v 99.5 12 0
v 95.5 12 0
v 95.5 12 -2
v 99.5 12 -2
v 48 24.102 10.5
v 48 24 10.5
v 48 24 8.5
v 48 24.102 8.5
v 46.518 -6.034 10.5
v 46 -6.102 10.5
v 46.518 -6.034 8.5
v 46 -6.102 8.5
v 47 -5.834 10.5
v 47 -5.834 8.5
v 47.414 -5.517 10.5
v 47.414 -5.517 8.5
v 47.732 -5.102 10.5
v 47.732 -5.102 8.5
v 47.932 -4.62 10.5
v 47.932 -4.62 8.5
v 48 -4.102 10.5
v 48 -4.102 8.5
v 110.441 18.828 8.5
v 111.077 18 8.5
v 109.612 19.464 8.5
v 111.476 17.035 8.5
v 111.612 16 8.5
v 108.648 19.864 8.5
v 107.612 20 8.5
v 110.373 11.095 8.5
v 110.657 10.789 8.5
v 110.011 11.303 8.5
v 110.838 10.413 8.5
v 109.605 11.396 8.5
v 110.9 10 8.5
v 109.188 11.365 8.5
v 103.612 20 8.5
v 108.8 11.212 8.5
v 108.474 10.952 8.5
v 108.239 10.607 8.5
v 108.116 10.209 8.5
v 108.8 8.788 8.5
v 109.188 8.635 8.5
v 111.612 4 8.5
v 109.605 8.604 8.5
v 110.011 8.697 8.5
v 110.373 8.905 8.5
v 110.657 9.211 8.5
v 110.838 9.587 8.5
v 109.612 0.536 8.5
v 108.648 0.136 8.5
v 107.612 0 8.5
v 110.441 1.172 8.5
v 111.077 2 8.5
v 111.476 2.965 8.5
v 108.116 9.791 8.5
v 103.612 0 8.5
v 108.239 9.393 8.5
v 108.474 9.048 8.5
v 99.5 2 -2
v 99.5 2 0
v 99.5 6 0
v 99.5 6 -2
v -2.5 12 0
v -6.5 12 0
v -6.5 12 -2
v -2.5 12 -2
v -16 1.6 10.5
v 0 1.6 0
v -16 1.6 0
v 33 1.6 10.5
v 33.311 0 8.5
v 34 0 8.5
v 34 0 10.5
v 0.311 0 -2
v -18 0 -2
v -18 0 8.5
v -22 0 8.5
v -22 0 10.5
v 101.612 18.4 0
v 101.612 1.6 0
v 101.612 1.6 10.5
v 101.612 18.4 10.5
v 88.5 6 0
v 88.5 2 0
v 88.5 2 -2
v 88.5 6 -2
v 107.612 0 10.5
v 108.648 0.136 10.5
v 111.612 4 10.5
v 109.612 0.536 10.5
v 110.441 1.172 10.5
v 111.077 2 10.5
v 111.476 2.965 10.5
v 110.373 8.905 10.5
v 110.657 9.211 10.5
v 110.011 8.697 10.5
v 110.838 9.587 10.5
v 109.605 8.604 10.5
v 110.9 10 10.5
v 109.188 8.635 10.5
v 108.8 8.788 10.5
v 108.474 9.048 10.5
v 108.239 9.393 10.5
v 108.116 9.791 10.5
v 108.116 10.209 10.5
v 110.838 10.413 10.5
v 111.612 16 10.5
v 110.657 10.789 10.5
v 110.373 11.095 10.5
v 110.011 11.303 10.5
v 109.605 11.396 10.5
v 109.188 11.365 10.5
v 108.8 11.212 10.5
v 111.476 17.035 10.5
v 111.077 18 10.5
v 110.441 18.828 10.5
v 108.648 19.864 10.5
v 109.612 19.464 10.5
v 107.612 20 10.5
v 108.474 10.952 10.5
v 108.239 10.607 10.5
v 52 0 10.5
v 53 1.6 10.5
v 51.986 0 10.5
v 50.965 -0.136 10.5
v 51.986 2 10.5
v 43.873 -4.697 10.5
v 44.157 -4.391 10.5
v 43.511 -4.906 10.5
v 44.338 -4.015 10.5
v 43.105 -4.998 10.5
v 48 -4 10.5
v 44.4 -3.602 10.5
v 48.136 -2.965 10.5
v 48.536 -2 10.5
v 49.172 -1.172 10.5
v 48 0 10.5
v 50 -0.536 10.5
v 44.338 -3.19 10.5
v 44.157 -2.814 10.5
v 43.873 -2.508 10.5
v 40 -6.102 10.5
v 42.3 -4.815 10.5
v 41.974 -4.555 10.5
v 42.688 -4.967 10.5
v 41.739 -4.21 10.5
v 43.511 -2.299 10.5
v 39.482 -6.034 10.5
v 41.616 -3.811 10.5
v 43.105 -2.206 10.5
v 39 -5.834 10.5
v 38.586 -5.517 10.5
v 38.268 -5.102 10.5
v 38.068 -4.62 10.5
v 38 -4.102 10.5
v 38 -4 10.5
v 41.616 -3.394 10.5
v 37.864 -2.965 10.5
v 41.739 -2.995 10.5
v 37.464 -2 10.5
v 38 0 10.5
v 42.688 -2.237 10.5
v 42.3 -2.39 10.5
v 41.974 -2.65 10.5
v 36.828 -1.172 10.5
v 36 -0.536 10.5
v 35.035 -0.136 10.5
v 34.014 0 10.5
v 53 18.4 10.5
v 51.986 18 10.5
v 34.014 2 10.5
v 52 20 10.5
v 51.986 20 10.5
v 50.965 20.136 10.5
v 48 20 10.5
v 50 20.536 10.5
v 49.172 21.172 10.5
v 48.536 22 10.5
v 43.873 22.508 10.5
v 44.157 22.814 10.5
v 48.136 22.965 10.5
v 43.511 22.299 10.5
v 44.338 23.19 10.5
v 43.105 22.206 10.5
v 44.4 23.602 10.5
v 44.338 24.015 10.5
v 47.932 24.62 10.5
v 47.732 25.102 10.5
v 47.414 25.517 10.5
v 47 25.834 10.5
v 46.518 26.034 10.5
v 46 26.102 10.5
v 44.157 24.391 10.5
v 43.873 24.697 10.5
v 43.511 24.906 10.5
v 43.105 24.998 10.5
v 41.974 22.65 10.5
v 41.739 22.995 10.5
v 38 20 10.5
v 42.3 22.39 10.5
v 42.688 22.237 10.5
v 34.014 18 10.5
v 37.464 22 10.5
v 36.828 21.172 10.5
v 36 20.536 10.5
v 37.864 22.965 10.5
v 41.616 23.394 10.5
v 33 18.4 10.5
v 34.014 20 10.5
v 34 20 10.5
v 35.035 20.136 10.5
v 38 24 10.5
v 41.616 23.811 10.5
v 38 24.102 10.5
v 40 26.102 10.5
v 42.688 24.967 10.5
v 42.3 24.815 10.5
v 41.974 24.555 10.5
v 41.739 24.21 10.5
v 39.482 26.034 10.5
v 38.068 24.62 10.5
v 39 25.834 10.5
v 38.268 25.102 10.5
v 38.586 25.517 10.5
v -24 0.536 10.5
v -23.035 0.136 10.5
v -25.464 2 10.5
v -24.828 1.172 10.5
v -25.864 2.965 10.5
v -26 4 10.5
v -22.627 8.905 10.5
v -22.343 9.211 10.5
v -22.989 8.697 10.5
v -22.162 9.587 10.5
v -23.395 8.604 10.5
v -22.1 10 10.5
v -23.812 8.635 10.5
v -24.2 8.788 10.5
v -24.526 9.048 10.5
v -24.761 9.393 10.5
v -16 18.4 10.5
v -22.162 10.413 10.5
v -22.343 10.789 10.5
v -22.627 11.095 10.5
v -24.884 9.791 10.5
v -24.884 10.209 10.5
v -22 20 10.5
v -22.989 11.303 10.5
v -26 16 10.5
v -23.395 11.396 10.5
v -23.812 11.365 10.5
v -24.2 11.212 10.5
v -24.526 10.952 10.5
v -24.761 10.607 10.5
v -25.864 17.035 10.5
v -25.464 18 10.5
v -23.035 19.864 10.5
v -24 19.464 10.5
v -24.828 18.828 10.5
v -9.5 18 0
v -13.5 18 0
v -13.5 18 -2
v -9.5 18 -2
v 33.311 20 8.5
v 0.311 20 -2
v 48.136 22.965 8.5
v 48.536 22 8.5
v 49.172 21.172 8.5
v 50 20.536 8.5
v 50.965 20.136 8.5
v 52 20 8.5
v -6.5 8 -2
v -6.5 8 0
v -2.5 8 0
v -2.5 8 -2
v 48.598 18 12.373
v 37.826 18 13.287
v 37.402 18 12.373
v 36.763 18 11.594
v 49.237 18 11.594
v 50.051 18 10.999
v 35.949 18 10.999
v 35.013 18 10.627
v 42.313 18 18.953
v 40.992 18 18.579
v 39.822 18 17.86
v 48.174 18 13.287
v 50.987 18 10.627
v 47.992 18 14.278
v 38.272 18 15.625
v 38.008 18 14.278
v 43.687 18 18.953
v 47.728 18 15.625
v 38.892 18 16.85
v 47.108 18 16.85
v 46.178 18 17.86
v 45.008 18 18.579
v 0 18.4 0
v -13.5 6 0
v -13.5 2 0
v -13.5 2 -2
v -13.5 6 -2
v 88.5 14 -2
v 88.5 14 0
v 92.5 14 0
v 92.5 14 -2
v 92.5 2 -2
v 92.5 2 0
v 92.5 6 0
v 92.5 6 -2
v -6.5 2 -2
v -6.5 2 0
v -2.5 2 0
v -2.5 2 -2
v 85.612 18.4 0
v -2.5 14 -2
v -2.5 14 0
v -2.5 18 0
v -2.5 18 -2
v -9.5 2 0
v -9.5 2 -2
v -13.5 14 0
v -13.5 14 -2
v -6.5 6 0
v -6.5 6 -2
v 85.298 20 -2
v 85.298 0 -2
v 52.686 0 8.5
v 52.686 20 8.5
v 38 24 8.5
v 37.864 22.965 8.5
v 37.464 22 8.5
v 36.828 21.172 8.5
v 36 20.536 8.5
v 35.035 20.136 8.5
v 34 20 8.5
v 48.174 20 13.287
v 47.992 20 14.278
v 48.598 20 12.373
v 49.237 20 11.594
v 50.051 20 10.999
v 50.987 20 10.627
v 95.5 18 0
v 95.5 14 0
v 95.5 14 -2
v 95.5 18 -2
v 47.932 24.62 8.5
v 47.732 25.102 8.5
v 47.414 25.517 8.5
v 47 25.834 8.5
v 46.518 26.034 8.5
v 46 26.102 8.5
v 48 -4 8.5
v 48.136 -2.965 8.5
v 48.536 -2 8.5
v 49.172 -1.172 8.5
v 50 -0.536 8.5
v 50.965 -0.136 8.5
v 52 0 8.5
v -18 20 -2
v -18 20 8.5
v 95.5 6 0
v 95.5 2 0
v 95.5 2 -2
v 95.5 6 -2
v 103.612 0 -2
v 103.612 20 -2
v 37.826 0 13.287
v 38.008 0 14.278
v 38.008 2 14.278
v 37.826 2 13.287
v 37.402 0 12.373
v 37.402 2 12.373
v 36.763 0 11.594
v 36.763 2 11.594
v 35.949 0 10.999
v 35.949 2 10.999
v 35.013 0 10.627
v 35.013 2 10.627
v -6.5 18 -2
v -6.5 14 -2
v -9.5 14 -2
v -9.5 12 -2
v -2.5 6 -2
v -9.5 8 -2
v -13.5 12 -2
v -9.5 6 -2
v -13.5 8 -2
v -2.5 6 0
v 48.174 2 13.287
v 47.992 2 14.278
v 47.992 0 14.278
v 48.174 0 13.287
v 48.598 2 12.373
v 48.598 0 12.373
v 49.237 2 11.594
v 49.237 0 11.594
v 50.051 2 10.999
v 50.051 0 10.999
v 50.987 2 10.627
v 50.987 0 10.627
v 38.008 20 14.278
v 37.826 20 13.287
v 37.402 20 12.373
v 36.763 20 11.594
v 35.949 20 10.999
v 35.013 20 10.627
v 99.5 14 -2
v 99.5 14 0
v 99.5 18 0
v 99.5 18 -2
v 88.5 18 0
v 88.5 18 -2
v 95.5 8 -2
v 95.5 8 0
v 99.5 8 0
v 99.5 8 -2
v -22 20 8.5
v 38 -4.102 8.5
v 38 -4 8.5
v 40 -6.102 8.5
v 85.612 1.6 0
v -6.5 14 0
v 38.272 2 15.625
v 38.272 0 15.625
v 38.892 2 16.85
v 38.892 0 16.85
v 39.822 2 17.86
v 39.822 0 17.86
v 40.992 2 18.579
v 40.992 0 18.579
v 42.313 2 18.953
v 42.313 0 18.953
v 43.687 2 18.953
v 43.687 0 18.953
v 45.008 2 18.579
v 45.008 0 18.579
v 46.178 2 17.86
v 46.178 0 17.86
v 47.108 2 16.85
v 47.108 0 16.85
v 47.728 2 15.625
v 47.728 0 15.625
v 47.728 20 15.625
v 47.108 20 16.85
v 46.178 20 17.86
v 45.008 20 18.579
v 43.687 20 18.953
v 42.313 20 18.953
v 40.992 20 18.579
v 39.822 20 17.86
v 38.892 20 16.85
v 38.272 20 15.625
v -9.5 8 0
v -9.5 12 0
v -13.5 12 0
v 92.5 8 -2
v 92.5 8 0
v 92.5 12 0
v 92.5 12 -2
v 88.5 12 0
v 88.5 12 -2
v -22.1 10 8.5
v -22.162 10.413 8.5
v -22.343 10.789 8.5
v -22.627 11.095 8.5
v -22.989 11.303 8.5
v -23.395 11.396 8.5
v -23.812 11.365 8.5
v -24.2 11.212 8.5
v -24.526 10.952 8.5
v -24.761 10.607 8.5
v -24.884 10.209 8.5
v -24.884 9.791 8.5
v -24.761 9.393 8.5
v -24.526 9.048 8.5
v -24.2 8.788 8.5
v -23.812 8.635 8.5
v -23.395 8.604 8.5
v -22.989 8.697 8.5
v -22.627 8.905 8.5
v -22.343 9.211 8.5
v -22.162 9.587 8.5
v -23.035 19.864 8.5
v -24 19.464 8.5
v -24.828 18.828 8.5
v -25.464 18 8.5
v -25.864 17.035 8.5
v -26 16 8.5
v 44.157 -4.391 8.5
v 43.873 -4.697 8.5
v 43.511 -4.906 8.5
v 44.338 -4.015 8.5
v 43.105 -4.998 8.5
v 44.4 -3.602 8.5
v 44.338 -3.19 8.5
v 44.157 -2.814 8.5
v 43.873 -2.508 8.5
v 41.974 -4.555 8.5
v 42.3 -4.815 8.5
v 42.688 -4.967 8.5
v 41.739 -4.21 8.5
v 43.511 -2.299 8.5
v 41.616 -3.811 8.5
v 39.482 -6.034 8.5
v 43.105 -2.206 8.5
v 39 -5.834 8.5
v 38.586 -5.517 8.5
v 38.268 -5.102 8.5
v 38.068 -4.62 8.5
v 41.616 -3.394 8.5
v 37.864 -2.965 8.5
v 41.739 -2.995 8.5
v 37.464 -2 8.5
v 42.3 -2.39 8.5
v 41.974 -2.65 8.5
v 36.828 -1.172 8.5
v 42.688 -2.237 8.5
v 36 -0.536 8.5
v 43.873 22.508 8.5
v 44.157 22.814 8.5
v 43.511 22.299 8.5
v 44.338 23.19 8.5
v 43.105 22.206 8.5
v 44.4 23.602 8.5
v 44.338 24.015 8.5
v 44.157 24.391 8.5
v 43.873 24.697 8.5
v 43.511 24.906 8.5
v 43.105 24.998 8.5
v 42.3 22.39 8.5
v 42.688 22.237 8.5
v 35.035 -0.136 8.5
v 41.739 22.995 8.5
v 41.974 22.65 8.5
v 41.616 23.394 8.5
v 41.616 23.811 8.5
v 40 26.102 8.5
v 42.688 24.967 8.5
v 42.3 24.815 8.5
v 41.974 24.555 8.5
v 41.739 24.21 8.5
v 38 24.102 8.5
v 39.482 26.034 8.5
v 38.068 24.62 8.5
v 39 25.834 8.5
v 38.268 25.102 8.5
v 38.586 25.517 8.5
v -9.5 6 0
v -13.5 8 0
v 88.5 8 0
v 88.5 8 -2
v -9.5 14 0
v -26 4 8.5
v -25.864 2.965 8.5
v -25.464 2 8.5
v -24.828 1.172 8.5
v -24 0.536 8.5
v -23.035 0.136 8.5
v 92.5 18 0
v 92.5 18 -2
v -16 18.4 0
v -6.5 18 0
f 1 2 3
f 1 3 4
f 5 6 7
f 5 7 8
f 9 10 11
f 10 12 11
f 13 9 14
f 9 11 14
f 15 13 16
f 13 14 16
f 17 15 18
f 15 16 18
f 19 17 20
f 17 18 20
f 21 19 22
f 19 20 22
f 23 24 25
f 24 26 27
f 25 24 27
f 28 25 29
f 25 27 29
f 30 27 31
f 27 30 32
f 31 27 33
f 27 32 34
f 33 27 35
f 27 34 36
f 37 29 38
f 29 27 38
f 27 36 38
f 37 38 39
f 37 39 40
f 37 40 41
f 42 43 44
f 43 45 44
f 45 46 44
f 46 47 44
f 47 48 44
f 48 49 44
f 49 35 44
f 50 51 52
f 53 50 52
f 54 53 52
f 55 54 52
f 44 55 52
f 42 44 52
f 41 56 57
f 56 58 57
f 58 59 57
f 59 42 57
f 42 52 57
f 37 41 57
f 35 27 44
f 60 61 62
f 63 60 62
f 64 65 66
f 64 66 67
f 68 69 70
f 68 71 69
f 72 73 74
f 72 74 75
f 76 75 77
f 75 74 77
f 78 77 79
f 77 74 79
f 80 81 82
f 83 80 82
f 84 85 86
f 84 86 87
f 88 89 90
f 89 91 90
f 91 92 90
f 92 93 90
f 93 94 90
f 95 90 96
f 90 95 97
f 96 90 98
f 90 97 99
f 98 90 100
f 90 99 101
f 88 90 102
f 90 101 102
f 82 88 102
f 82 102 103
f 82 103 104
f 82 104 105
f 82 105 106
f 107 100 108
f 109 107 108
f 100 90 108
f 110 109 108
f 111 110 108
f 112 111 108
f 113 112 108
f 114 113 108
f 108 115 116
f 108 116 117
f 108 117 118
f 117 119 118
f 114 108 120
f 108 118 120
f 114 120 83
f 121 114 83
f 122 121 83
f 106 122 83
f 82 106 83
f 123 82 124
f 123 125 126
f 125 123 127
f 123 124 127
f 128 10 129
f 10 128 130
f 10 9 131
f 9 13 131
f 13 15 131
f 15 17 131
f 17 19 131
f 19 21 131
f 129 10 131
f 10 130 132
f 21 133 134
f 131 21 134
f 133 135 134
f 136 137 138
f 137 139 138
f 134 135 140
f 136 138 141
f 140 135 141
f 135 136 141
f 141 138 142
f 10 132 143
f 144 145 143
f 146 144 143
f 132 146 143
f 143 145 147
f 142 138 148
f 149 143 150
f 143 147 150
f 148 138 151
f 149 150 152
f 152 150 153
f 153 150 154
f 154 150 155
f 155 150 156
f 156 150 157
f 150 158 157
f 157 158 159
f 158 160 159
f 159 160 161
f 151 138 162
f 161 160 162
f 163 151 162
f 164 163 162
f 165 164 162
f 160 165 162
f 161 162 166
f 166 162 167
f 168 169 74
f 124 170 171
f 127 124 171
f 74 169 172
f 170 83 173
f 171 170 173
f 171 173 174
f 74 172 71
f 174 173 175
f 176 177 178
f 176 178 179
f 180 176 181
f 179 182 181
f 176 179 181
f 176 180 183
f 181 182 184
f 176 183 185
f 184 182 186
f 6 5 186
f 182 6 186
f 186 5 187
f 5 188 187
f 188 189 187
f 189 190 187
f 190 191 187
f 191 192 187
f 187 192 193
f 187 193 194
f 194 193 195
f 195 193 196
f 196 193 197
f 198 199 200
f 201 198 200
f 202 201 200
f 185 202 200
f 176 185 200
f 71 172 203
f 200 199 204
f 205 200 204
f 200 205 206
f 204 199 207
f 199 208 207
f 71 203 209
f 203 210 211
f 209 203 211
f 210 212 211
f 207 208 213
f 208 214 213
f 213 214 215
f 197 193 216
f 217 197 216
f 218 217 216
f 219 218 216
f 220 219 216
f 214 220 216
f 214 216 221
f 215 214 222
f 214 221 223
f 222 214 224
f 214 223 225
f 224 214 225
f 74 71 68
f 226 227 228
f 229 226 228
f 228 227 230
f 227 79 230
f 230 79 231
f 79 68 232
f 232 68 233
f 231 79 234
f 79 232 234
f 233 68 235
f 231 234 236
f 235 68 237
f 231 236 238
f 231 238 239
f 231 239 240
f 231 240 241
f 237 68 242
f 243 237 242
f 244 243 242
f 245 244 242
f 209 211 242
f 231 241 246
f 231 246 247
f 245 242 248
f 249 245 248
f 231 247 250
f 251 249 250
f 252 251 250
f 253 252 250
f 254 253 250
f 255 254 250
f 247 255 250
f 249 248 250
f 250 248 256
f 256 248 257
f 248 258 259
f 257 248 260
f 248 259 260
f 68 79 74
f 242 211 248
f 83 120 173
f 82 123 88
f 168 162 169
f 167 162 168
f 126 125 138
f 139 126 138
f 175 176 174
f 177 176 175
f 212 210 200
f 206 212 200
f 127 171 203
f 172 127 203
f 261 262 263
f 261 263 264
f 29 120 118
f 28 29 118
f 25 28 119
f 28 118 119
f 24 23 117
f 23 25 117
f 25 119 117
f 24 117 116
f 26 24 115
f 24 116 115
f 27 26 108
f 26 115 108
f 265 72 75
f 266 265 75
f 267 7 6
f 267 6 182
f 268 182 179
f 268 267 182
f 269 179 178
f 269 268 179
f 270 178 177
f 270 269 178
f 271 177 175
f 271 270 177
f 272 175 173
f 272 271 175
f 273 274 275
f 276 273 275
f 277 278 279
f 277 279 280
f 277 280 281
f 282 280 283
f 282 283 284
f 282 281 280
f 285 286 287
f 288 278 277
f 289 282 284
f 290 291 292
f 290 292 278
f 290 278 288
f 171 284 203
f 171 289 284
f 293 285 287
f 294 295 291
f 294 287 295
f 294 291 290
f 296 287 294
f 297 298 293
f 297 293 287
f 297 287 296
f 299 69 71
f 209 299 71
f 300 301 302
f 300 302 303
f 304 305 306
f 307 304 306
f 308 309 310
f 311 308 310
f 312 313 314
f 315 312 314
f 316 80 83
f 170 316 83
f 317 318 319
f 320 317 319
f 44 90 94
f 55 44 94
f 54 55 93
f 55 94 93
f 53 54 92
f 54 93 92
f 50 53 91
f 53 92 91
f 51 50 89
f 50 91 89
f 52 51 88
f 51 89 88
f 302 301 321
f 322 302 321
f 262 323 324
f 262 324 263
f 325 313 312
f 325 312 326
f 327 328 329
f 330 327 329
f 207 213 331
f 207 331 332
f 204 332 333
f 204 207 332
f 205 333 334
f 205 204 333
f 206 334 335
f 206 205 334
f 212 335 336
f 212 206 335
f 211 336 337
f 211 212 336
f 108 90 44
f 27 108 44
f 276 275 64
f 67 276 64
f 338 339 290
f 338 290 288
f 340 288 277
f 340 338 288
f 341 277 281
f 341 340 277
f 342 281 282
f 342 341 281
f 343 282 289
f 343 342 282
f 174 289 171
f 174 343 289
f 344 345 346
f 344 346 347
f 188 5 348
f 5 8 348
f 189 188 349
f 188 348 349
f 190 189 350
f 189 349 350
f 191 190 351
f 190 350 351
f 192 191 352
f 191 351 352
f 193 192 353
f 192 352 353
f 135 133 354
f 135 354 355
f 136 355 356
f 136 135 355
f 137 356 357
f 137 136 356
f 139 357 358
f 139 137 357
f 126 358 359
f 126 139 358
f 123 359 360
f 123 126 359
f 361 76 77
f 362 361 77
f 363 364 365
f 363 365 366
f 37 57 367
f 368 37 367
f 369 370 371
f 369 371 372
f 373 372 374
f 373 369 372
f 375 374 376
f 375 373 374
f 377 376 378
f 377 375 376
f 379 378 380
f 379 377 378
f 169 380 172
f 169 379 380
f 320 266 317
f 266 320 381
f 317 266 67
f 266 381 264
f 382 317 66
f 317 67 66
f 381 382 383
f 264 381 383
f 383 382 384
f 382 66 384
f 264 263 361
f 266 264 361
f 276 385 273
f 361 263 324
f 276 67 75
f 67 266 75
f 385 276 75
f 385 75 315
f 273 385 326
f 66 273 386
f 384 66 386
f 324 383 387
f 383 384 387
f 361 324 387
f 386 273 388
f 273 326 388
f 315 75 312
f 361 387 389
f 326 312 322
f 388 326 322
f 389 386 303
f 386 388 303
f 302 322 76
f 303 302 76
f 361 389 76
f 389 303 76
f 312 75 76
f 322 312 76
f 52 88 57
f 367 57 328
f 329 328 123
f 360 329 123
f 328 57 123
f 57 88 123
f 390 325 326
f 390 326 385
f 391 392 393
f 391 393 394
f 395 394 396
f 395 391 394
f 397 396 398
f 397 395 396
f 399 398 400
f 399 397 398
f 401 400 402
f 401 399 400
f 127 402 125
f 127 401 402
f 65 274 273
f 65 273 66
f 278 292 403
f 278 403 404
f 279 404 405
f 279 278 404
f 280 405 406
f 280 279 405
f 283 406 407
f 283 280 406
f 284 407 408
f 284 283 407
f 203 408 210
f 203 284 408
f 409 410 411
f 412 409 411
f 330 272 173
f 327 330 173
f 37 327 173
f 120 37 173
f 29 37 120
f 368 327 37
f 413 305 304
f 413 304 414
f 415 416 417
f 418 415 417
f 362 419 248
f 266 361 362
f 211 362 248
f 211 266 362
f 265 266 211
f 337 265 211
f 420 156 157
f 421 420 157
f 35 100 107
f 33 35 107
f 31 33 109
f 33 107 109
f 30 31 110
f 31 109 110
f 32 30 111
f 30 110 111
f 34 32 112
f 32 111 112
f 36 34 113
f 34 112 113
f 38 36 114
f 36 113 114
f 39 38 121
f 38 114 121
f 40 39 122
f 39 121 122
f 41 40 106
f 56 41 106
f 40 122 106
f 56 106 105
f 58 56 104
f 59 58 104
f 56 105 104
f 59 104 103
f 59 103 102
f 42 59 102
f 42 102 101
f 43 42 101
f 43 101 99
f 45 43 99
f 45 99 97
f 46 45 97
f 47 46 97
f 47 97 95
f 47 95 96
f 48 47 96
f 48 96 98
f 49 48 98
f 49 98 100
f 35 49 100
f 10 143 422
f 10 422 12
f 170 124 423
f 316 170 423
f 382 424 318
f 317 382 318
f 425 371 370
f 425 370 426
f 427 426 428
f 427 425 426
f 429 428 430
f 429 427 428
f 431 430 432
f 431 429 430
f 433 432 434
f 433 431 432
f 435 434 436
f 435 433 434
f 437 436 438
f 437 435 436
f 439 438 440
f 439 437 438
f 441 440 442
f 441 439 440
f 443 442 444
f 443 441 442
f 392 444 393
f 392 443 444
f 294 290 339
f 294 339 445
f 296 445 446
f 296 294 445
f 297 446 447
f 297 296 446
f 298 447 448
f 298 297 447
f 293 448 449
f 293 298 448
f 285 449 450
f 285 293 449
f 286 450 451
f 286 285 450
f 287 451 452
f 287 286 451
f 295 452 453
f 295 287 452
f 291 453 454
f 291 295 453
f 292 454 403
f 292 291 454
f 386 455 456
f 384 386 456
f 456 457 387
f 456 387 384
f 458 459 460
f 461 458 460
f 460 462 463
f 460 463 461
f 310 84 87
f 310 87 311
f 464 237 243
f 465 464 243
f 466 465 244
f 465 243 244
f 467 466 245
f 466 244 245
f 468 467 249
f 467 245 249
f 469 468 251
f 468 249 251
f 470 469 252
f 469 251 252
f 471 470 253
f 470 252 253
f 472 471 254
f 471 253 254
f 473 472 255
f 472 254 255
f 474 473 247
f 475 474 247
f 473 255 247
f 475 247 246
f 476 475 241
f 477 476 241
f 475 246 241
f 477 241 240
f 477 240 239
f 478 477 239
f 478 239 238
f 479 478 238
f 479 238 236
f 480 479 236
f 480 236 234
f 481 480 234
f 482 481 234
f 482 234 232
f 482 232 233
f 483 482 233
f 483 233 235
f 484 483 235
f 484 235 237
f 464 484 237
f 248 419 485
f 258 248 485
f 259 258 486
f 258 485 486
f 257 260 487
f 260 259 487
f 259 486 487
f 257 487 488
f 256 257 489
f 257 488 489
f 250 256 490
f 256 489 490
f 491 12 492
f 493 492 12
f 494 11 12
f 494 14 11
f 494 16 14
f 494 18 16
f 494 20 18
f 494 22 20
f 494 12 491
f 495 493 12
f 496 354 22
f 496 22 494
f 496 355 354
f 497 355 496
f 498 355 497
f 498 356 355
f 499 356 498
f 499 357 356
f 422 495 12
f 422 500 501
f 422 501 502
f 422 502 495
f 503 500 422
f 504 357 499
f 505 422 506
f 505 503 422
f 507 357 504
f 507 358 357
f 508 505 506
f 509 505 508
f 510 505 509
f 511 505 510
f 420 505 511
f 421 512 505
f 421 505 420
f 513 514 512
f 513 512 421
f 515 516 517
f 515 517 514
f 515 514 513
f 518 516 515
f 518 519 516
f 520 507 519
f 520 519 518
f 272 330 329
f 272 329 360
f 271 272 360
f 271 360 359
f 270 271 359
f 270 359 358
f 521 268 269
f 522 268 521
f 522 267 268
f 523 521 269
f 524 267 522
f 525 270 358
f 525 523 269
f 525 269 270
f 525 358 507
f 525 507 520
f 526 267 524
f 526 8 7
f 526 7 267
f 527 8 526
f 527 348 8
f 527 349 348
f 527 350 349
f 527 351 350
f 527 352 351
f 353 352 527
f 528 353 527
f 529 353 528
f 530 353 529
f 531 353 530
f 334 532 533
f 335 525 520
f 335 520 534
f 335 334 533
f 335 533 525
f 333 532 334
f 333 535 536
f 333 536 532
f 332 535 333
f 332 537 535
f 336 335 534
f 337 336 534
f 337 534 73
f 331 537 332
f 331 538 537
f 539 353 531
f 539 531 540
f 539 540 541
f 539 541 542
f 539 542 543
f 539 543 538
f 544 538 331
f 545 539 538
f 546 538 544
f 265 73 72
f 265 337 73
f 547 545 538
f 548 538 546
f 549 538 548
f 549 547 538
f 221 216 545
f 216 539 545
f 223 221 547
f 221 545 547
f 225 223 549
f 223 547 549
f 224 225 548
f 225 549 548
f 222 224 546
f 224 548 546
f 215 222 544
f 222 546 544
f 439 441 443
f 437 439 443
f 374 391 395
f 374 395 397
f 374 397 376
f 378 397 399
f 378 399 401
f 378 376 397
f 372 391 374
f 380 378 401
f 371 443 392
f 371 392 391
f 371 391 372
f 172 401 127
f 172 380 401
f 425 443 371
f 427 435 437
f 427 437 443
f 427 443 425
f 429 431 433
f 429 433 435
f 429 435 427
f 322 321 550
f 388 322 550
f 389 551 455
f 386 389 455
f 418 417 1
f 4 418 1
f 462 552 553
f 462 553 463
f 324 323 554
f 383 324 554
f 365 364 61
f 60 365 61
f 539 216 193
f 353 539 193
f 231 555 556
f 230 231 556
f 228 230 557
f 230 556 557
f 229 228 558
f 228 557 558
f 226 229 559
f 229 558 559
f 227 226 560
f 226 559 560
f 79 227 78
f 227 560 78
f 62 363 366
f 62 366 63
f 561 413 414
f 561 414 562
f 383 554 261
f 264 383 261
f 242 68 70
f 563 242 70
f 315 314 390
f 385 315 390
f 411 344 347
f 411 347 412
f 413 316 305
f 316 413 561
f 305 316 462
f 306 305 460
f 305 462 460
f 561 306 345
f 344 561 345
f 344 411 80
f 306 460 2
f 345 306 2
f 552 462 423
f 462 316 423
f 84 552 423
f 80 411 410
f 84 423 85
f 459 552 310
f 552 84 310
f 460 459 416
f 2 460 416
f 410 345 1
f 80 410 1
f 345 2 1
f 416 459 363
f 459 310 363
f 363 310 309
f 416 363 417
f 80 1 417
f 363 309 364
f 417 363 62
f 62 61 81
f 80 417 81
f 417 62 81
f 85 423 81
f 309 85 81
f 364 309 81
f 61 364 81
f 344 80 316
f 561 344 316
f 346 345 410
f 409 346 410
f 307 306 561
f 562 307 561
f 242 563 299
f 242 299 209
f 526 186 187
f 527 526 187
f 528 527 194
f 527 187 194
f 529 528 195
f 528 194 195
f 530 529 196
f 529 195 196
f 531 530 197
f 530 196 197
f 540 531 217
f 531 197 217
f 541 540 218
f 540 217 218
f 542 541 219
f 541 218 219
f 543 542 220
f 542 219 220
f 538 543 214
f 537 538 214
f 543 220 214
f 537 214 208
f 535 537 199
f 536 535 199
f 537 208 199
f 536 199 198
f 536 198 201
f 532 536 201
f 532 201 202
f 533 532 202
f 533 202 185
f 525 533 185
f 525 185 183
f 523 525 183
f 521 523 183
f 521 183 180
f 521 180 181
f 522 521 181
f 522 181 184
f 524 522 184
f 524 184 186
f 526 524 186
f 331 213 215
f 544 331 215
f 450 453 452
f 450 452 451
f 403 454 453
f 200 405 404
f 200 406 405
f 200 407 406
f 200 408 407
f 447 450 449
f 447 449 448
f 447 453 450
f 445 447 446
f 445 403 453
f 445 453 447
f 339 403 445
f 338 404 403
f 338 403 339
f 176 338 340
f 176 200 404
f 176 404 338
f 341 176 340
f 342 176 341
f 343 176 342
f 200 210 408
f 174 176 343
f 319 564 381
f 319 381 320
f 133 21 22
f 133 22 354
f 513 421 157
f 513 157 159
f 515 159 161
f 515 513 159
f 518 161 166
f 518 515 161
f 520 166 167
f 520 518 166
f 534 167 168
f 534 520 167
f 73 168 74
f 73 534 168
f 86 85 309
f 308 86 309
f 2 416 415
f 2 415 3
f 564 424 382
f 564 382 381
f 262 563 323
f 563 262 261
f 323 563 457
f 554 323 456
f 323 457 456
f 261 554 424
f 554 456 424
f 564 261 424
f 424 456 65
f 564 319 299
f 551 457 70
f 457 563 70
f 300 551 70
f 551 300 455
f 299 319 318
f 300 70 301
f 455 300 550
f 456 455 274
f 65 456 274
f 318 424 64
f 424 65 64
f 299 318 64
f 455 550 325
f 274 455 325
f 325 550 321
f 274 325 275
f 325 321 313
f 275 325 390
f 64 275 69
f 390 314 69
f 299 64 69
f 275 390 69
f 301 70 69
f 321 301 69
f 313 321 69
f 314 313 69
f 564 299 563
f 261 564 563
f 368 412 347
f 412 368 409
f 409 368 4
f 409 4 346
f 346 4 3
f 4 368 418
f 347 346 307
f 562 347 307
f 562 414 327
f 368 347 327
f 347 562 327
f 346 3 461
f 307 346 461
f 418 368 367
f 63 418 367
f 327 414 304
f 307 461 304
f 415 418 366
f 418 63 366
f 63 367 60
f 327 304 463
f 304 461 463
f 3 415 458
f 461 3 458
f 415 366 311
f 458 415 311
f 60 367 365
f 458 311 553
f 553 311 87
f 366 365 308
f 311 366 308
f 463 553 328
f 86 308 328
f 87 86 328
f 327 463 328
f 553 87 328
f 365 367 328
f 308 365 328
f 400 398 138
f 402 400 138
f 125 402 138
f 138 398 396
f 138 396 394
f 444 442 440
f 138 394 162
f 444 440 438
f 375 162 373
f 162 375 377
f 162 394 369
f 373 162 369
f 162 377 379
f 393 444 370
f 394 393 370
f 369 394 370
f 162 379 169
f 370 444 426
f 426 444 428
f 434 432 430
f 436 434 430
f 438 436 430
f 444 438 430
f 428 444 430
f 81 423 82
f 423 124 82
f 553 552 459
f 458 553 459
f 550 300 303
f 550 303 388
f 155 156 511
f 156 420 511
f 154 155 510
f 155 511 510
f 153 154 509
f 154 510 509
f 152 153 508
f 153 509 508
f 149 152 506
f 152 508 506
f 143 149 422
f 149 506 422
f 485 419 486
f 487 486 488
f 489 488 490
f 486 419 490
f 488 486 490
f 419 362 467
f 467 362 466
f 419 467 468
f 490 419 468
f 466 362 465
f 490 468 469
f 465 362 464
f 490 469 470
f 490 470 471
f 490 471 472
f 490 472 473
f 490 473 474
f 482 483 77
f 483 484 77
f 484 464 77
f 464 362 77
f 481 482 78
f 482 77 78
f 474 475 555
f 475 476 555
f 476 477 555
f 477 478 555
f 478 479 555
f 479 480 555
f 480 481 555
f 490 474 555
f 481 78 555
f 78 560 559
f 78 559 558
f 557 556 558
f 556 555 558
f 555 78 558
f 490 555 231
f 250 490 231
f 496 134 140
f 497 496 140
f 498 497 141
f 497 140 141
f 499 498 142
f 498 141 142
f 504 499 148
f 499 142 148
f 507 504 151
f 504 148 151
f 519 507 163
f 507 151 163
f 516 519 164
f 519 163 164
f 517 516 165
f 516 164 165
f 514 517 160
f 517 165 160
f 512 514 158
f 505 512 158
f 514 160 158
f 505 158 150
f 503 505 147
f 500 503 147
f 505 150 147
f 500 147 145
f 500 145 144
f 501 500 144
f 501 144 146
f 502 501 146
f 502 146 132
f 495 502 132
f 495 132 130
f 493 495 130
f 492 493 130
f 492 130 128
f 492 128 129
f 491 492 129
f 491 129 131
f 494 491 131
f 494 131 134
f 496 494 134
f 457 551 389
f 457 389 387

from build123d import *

# Parameters (mm, degrees)
ESTRUSIONE_ESTRUSIONE1_DEPTH = 20
SCHIZZO2_W                   = 4
SCHIZZO2_H                   = 4
TAGLIO_ESTRUSIONE2_DEPTH     = 20
SCHIZZO3_W                   = 10
SCHIZZO3_H                   = 6.102364877
ESTRUSIONE_ESTRUSIONE3_DEPTH = 2
ESTRUSIONE_ESTRUSIONE4_DEPTH = 1.6
ESTRUSIONE_ESTRUSIONE5_DEPTH = 1.6
SCHIZZO15_W                  = 10
SCHIZZO15_H                  = 2
ESTRUSIONE_ESTRUSIONE6_DEPTH = 8.5
ESTRUSIONE_ESTRUSIONE7_DEPTH = 1.6
ESTRUSIONE_ESTRUSIONE8_DEPTH = 1.6
SCHIZZO24_W                  = 10
SCHIZZO24_H                  = 2
ESTRUSIONE_ESTRUSIONE9_DEPTH = 8.5
RACCORDO1_RADIUS             = 5
RACCORDO1_LENGTH             = 2
RACCORDO2_RADIUS             = 5
RACCORDO2_LENGTH             = 2
RACCORDO3_R                  = 4
RACCORDO4_R                  = 4
RACCORDO6_R                  = 2
SCHIZZO28_R                  = 1.4
TAGLIO_ESTRUSIONE5_DEPTH     = 10
SCHIZZO29_R                  = 1.4
TAGLIO_ESTRUSIONE6_DEPTH     = 10


with BuildPart() as part:
    # Schizzo1 → Estrusione-Estrusione1 (new body)
    with BuildSketch(Plane(origin=(0, 0, 0), x_dir=(1, 0, 0), z_dir=(0, 1, 0))):
        Polygon((-16, 0), (0, 0), (33, -10.5), (53, -10.5), (85.612492158, 0), (101.612492158, 0), (101.612492158, -10.5), (111.612492158, -10.5), (111.612492158, -8.5), (103.612492158, -8.5), (103.612492158, 2), (85.29846697, 2), (52.685974812, -8.5), (33.310512217, -8.5), (0.310512217, 2), (-18, 2), (-18, -8.5), (-26, -8.5), (-26, -10.5), (-16, -10.5), align=None)
    extrude(amount=ESTRUSIONE_ESTRUSIONE1_DEPTH)

    # Schizzo2 → Taglio-Estrusione2 (cut)
    with BuildSketch(Plane.XY):
        with Locations((-11.5, 16)):
            Rectangle(SCHIZZO2_W, SCHIZZO2_H)
        with Locations((-4.5, 16)):
            Rectangle(SCHIZZO2_W, SCHIZZO2_H)
        with Locations((-4.5, 10)):
            Rectangle(SCHIZZO2_W, SCHIZZO2_H)
        with Locations((-4.5, 4)):
            Rectangle(SCHIZZO2_W, SCHIZZO2_H)
        with Locations((-11.5, 10)):
            Rectangle(SCHIZZO2_W, SCHIZZO2_H)
        with Locations((-11.5, 4)):
            Rectangle(SCHIZZO2_W, SCHIZZO2_H)
        with Locations((97.5, 4)):
            Rectangle(SCHIZZO2_W, SCHIZZO2_H)
        with Locations((90.5, 4)):
            Rectangle(SCHIZZO2_W, SCHIZZO2_H)
        with Locations((90.5, 10)):
            Rectangle(SCHIZZO2_W, SCHIZZO2_H)
        with Locations((97.5, 10)):
            Rectangle(SCHIZZO2_W, SCHIZZO2_H)
        with Locations((90.5, 16)):
            Rectangle(SCHIZZO2_W, SCHIZZO2_H)
        with Locations((97.5, 16)):
            Rectangle(SCHIZZO2_W, SCHIZZO2_H)
    extrude(amount=-TAGLIO_ESTRUSIONE2_DEPTH, mode=Mode.SUBTRACT)

    # Schizzo3 → Estrusione-Estrusione3 (add)
    with BuildSketch(Plane.XY.offset(10.5)):
        with Locations((43, 23.051182438)):
            Rectangle(SCHIZZO3_W, SCHIZZO3_H)
        with Locations((43, -3.051182439)):
            Rectangle(SCHIZZO3_W, SCHIZZO3_H)
    extrude(amount=-ESTRUSIONE_ESTRUSIONE3_DEPTH)

    # Schizzo4 → Estrusione-Estrusione4 (add)
    with BuildSketch(Plane.XZ):
        Polygon((-16, 0), (-16, 10.5), (33, 10.5), (0, 0), align=None)
    extrude(amount=-ESTRUSIONE_ESTRUSIONE4_DEPTH)

    # Schizzo6 → Estrusione-Estrusione5 (add)
    with BuildSketch(Plane.XZ):
        Polygon((101.612492158, 10.5), (53, 10.5), (85.612492158, 0), (101.612492158, 0), align=None)
    extrude(amount=-ESTRUSIONE_ESTRUSIONE5_DEPTH)

    # Schizzo15 → Estrusione-Estrusione6 (add)
    with BuildSketch(Plane.XY.offset(10.5)):
        with Locations((43, 1)):
            Rectangle(SCHIZZO15_W, SCHIZZO15_H)
    extrude(amount=ESTRUSIONE_ESTRUSIONE6_DEPTH)

    # Schizzo20 → Estrusione-Estrusione7 (add)
    with BuildSketch(Plane(origin=(0, 20, 0), x_dir=(1, 0, 0), z_dir=(0, 1, 0))):
        Polygon((101.612492158, -10.5), (53, -10.5), (85.612492158, 0), (101.612492158, 0), align=None)
    extrude(amount=-ESTRUSIONE_ESTRUSIONE7_DEPTH)

    # Schizzo23 → Estrusione-Estrusione8 (add)
    with BuildSketch(Plane(origin=(0, 20, 0), x_dir=(1, 0, 0), z_dir=(0, 1, 0))):
        Polygon((-16, -10.5), (33, -10.5), (0, 0), (-16, 0), align=None)
    extrude(amount=-ESTRUSIONE_ESTRUSIONE8_DEPTH)

    # Schizzo24 → Estrusione-Estrusione9 (add)
    with BuildSketch(Plane.XY.offset(10.5)):
        with Locations((43, 19)):
            Rectangle(SCHIZZO24_W, SCHIZZO24_H)
    extrude(amount=ESTRUSIONE_ESTRUSIONE9_DEPTH)

    # Raccordo1: full round fillet: the end face becomes a half cylinder, R = half its width
    raccordo1_face = Plane((43, 19, 19), x_dir=(0, -1, 0), z_dir=(0, 0, 1))  # on the end face: x along it, z out of the body
    raccordo1_slab = raccordo1_face.offset(-RACCORDO1_RADIUS / 2) * Box(RACCORDO1_LENGTH, 2 * RACCORDO1_RADIUS, RACCORDO1_RADIUS, mode=Mode.PRIVATE)  # the body's end, R deep
    raccordo1_round = Plane((43, 19, 14), x_dir=(0, 0, 1), z_dir=(0, -1, 0)) * Cylinder(RACCORDO1_RADIUS, RACCORDO1_LENGTH, mode=Mode.PRIVATE)  # its axis R under the face
    add(raccordo1_slab - raccordo1_round, mode=Mode.SUBTRACT)

    # Raccordo2: full round fillet: the end face becomes a half cylinder, R = half its width
    raccordo2_face = Plane((43, 1, 19), x_dir=(0, 1, 0), z_dir=(0, 0, 1))  # on the end face: x along it, z out of the body
    raccordo2_slab = raccordo2_face.offset(-RACCORDO2_RADIUS / 2) * Box(RACCORDO2_LENGTH, 2 * RACCORDO2_RADIUS, RACCORDO2_RADIUS, mode=Mode.PRIVATE)  # the body's end, R deep
    raccordo2_round = Plane((43, 1, 14), x_dir=(0, 0, 1), z_dir=(0, 1, 0)) * Cylinder(RACCORDO2_RADIUS, RACCORDO2_LENGTH, mode=Mode.PRIVATE)  # its axis R under the face
    add(raccordo2_slab - raccordo2_round, mode=Mode.SUBTRACT)

    # Raccordo3
    # the kernel refuses this fillet: 4 mm, written as the material it adds along each edge
    with BuildSketch(Plane(origin=(48, 2, 10.5), x_dir=(1, 0, 0), z_dir=(0, -1, 0)), Plane(origin=(38, 0, 10.5), x_dir=(-1, 0, 0), z_dir=(0, 1, 0)), Plane(origin=(38, 18, 10.5), x_dir=(-1, 0, 0), z_dir=(0, 1, 0)), Plane(origin=(48, 20, 10.5), x_dir=(1, 0, 0), z_dir=(0, -1, 0))) as raccordo3_piece_1:
        with BuildLine():
            CenterArc((3.986100378, 4), RACCORDO3_R, 183.184738537, 86.815261463)
            Line((-0.007722012, 3.777777778), (-0.407104251, 3.755555556))
            ThreePointArc((-0.407104251, 3.755555556), (-0.4, 3.5), (-0.4, 0))
            Line((-0.4, 0), (0, -0.4))
            Line((0, -0.4), (3.986100378, -0.4))
            Line((3.986100378, -0.4), (3.986100378, 0))
        make_face()
    extrude(amount=2)
    # the kernel refuses this fillet: 4 mm, written as the material it takes off along each edge
    with BuildSketch(Plane(origin=(-26, 0, -1.5), x_dir=(0, 1, 0), z_dir=(0, 0, 1)), Plane(origin=(111.612492158, 0, 20.5), x_dir=(0, 1, 0), z_dir=(0, 0, -1))) as raccordo3_2_piece_1:
        with BuildLine():
            CenterArc((RACCORDO3_R, -RACCORDO3_R), RACCORDO3_R, 90, 90)
            Line((0, -RACCORDO3_R), (0, 0))
            Line((0, 0), (RACCORDO3_R, 0))
        make_face()
    extrude(amount=22, mode=Mode.SUBTRACT)
    with BuildSketch(Plane(origin=(111.612492158, 20, 20.5), x_dir=(0, -1, 0), z_dir=(0, 0, -1)), Plane(origin=(-26, 20, -1.5), x_dir=(0, -1, 0), z_dir=(0, 0, 1))) as raccordo3_2_piece_2:
        with BuildLine():
            CenterArc((RACCORDO3_R, RACCORDO3_R), RACCORDO3_R, 180, 90)
            Line((0, RACCORDO3_R), (0, 0))
            Line((0, 0), (RACCORDO3_R, 0))
        make_face()
    extrude(amount=22, mode=Mode.SUBTRACT)

    # Raccordo4
    # the kernel refuses this fillet: 4 mm, written as the material it adds along each edge
    with BuildSketch(Plane(origin=(48, 20, 8.5), x_dir=(1, 0, 0), z_dir=(0, 0, 1)), Plane(origin=(38, 20, 10.5), x_dir=(-1, 0, 0), z_dir=(0, 0, -1)), Plane(origin=(38, 0, 8.5), x_dir=(-1, 0, 0), z_dir=(0, 0, 1)), Plane(origin=(48, 0, 10.5), x_dir=(1, 0, 0), z_dir=(0, 0, -1))) as raccordo4_piece_1:
        with BuildLine():
            CenterArc((RACCORDO4_R, RACCORDO4_R), RACCORDO4_R, 180, 90)
            Line((0, RACCORDO4_R), (0, 0))
            Line((0, 0), (RACCORDO4_R, 0))
        make_face()
    extrude(amount=2)

    # Raccordo6
    raccordo6_edges = [part.edges().sort_by_distance(p)[0] for p in [
        (38, 26.102364877, 9.5),
        (48, 26.102364877, 9.5),
        (48, -6.102364877, 9.5),
        (38, -6.102364877, 9.5),
    ]]
    fillet(raccordo6_edges, radius=RACCORDO6_R)

    # Schizzo28 → Taglio-Estrusione5 (cut)
    with BuildSketch(Plane(origin=(42.230610684, 213.6, 10.5), x_dir=(1, 0, 0), z_dir=(0, 0, 1))):
        with Locations((0.769389316, -189.997635123)):
            Circle(SCHIZZO28_R)
        with Locations((0.769389316, -217.202364877)):
            Circle(SCHIZZO28_R)
    extrude(amount=-TAGLIO_ESTRUSIONE5_DEPTH, mode=Mode.SUBTRACT)

    # Schizzo29 → Taglio-Estrusione6 (cut)
    with BuildSketch(Plane(origin=(42.230610684, 213.6, 10.5), x_dir=(1, 0, 0), z_dir=(0, 0, 1))):
        with Locations((-65.730610684, -203.6)):
            Circle(SCHIZZO29_R)
        with Locations((67.269389316, -203.6)):
            Circle(SCHIZZO29_R)
    extrude(amount=-TAGLIO_ESTRUSIONE6_DEPTH, mode=Mode.SUBTRACT)


solid = part.part
